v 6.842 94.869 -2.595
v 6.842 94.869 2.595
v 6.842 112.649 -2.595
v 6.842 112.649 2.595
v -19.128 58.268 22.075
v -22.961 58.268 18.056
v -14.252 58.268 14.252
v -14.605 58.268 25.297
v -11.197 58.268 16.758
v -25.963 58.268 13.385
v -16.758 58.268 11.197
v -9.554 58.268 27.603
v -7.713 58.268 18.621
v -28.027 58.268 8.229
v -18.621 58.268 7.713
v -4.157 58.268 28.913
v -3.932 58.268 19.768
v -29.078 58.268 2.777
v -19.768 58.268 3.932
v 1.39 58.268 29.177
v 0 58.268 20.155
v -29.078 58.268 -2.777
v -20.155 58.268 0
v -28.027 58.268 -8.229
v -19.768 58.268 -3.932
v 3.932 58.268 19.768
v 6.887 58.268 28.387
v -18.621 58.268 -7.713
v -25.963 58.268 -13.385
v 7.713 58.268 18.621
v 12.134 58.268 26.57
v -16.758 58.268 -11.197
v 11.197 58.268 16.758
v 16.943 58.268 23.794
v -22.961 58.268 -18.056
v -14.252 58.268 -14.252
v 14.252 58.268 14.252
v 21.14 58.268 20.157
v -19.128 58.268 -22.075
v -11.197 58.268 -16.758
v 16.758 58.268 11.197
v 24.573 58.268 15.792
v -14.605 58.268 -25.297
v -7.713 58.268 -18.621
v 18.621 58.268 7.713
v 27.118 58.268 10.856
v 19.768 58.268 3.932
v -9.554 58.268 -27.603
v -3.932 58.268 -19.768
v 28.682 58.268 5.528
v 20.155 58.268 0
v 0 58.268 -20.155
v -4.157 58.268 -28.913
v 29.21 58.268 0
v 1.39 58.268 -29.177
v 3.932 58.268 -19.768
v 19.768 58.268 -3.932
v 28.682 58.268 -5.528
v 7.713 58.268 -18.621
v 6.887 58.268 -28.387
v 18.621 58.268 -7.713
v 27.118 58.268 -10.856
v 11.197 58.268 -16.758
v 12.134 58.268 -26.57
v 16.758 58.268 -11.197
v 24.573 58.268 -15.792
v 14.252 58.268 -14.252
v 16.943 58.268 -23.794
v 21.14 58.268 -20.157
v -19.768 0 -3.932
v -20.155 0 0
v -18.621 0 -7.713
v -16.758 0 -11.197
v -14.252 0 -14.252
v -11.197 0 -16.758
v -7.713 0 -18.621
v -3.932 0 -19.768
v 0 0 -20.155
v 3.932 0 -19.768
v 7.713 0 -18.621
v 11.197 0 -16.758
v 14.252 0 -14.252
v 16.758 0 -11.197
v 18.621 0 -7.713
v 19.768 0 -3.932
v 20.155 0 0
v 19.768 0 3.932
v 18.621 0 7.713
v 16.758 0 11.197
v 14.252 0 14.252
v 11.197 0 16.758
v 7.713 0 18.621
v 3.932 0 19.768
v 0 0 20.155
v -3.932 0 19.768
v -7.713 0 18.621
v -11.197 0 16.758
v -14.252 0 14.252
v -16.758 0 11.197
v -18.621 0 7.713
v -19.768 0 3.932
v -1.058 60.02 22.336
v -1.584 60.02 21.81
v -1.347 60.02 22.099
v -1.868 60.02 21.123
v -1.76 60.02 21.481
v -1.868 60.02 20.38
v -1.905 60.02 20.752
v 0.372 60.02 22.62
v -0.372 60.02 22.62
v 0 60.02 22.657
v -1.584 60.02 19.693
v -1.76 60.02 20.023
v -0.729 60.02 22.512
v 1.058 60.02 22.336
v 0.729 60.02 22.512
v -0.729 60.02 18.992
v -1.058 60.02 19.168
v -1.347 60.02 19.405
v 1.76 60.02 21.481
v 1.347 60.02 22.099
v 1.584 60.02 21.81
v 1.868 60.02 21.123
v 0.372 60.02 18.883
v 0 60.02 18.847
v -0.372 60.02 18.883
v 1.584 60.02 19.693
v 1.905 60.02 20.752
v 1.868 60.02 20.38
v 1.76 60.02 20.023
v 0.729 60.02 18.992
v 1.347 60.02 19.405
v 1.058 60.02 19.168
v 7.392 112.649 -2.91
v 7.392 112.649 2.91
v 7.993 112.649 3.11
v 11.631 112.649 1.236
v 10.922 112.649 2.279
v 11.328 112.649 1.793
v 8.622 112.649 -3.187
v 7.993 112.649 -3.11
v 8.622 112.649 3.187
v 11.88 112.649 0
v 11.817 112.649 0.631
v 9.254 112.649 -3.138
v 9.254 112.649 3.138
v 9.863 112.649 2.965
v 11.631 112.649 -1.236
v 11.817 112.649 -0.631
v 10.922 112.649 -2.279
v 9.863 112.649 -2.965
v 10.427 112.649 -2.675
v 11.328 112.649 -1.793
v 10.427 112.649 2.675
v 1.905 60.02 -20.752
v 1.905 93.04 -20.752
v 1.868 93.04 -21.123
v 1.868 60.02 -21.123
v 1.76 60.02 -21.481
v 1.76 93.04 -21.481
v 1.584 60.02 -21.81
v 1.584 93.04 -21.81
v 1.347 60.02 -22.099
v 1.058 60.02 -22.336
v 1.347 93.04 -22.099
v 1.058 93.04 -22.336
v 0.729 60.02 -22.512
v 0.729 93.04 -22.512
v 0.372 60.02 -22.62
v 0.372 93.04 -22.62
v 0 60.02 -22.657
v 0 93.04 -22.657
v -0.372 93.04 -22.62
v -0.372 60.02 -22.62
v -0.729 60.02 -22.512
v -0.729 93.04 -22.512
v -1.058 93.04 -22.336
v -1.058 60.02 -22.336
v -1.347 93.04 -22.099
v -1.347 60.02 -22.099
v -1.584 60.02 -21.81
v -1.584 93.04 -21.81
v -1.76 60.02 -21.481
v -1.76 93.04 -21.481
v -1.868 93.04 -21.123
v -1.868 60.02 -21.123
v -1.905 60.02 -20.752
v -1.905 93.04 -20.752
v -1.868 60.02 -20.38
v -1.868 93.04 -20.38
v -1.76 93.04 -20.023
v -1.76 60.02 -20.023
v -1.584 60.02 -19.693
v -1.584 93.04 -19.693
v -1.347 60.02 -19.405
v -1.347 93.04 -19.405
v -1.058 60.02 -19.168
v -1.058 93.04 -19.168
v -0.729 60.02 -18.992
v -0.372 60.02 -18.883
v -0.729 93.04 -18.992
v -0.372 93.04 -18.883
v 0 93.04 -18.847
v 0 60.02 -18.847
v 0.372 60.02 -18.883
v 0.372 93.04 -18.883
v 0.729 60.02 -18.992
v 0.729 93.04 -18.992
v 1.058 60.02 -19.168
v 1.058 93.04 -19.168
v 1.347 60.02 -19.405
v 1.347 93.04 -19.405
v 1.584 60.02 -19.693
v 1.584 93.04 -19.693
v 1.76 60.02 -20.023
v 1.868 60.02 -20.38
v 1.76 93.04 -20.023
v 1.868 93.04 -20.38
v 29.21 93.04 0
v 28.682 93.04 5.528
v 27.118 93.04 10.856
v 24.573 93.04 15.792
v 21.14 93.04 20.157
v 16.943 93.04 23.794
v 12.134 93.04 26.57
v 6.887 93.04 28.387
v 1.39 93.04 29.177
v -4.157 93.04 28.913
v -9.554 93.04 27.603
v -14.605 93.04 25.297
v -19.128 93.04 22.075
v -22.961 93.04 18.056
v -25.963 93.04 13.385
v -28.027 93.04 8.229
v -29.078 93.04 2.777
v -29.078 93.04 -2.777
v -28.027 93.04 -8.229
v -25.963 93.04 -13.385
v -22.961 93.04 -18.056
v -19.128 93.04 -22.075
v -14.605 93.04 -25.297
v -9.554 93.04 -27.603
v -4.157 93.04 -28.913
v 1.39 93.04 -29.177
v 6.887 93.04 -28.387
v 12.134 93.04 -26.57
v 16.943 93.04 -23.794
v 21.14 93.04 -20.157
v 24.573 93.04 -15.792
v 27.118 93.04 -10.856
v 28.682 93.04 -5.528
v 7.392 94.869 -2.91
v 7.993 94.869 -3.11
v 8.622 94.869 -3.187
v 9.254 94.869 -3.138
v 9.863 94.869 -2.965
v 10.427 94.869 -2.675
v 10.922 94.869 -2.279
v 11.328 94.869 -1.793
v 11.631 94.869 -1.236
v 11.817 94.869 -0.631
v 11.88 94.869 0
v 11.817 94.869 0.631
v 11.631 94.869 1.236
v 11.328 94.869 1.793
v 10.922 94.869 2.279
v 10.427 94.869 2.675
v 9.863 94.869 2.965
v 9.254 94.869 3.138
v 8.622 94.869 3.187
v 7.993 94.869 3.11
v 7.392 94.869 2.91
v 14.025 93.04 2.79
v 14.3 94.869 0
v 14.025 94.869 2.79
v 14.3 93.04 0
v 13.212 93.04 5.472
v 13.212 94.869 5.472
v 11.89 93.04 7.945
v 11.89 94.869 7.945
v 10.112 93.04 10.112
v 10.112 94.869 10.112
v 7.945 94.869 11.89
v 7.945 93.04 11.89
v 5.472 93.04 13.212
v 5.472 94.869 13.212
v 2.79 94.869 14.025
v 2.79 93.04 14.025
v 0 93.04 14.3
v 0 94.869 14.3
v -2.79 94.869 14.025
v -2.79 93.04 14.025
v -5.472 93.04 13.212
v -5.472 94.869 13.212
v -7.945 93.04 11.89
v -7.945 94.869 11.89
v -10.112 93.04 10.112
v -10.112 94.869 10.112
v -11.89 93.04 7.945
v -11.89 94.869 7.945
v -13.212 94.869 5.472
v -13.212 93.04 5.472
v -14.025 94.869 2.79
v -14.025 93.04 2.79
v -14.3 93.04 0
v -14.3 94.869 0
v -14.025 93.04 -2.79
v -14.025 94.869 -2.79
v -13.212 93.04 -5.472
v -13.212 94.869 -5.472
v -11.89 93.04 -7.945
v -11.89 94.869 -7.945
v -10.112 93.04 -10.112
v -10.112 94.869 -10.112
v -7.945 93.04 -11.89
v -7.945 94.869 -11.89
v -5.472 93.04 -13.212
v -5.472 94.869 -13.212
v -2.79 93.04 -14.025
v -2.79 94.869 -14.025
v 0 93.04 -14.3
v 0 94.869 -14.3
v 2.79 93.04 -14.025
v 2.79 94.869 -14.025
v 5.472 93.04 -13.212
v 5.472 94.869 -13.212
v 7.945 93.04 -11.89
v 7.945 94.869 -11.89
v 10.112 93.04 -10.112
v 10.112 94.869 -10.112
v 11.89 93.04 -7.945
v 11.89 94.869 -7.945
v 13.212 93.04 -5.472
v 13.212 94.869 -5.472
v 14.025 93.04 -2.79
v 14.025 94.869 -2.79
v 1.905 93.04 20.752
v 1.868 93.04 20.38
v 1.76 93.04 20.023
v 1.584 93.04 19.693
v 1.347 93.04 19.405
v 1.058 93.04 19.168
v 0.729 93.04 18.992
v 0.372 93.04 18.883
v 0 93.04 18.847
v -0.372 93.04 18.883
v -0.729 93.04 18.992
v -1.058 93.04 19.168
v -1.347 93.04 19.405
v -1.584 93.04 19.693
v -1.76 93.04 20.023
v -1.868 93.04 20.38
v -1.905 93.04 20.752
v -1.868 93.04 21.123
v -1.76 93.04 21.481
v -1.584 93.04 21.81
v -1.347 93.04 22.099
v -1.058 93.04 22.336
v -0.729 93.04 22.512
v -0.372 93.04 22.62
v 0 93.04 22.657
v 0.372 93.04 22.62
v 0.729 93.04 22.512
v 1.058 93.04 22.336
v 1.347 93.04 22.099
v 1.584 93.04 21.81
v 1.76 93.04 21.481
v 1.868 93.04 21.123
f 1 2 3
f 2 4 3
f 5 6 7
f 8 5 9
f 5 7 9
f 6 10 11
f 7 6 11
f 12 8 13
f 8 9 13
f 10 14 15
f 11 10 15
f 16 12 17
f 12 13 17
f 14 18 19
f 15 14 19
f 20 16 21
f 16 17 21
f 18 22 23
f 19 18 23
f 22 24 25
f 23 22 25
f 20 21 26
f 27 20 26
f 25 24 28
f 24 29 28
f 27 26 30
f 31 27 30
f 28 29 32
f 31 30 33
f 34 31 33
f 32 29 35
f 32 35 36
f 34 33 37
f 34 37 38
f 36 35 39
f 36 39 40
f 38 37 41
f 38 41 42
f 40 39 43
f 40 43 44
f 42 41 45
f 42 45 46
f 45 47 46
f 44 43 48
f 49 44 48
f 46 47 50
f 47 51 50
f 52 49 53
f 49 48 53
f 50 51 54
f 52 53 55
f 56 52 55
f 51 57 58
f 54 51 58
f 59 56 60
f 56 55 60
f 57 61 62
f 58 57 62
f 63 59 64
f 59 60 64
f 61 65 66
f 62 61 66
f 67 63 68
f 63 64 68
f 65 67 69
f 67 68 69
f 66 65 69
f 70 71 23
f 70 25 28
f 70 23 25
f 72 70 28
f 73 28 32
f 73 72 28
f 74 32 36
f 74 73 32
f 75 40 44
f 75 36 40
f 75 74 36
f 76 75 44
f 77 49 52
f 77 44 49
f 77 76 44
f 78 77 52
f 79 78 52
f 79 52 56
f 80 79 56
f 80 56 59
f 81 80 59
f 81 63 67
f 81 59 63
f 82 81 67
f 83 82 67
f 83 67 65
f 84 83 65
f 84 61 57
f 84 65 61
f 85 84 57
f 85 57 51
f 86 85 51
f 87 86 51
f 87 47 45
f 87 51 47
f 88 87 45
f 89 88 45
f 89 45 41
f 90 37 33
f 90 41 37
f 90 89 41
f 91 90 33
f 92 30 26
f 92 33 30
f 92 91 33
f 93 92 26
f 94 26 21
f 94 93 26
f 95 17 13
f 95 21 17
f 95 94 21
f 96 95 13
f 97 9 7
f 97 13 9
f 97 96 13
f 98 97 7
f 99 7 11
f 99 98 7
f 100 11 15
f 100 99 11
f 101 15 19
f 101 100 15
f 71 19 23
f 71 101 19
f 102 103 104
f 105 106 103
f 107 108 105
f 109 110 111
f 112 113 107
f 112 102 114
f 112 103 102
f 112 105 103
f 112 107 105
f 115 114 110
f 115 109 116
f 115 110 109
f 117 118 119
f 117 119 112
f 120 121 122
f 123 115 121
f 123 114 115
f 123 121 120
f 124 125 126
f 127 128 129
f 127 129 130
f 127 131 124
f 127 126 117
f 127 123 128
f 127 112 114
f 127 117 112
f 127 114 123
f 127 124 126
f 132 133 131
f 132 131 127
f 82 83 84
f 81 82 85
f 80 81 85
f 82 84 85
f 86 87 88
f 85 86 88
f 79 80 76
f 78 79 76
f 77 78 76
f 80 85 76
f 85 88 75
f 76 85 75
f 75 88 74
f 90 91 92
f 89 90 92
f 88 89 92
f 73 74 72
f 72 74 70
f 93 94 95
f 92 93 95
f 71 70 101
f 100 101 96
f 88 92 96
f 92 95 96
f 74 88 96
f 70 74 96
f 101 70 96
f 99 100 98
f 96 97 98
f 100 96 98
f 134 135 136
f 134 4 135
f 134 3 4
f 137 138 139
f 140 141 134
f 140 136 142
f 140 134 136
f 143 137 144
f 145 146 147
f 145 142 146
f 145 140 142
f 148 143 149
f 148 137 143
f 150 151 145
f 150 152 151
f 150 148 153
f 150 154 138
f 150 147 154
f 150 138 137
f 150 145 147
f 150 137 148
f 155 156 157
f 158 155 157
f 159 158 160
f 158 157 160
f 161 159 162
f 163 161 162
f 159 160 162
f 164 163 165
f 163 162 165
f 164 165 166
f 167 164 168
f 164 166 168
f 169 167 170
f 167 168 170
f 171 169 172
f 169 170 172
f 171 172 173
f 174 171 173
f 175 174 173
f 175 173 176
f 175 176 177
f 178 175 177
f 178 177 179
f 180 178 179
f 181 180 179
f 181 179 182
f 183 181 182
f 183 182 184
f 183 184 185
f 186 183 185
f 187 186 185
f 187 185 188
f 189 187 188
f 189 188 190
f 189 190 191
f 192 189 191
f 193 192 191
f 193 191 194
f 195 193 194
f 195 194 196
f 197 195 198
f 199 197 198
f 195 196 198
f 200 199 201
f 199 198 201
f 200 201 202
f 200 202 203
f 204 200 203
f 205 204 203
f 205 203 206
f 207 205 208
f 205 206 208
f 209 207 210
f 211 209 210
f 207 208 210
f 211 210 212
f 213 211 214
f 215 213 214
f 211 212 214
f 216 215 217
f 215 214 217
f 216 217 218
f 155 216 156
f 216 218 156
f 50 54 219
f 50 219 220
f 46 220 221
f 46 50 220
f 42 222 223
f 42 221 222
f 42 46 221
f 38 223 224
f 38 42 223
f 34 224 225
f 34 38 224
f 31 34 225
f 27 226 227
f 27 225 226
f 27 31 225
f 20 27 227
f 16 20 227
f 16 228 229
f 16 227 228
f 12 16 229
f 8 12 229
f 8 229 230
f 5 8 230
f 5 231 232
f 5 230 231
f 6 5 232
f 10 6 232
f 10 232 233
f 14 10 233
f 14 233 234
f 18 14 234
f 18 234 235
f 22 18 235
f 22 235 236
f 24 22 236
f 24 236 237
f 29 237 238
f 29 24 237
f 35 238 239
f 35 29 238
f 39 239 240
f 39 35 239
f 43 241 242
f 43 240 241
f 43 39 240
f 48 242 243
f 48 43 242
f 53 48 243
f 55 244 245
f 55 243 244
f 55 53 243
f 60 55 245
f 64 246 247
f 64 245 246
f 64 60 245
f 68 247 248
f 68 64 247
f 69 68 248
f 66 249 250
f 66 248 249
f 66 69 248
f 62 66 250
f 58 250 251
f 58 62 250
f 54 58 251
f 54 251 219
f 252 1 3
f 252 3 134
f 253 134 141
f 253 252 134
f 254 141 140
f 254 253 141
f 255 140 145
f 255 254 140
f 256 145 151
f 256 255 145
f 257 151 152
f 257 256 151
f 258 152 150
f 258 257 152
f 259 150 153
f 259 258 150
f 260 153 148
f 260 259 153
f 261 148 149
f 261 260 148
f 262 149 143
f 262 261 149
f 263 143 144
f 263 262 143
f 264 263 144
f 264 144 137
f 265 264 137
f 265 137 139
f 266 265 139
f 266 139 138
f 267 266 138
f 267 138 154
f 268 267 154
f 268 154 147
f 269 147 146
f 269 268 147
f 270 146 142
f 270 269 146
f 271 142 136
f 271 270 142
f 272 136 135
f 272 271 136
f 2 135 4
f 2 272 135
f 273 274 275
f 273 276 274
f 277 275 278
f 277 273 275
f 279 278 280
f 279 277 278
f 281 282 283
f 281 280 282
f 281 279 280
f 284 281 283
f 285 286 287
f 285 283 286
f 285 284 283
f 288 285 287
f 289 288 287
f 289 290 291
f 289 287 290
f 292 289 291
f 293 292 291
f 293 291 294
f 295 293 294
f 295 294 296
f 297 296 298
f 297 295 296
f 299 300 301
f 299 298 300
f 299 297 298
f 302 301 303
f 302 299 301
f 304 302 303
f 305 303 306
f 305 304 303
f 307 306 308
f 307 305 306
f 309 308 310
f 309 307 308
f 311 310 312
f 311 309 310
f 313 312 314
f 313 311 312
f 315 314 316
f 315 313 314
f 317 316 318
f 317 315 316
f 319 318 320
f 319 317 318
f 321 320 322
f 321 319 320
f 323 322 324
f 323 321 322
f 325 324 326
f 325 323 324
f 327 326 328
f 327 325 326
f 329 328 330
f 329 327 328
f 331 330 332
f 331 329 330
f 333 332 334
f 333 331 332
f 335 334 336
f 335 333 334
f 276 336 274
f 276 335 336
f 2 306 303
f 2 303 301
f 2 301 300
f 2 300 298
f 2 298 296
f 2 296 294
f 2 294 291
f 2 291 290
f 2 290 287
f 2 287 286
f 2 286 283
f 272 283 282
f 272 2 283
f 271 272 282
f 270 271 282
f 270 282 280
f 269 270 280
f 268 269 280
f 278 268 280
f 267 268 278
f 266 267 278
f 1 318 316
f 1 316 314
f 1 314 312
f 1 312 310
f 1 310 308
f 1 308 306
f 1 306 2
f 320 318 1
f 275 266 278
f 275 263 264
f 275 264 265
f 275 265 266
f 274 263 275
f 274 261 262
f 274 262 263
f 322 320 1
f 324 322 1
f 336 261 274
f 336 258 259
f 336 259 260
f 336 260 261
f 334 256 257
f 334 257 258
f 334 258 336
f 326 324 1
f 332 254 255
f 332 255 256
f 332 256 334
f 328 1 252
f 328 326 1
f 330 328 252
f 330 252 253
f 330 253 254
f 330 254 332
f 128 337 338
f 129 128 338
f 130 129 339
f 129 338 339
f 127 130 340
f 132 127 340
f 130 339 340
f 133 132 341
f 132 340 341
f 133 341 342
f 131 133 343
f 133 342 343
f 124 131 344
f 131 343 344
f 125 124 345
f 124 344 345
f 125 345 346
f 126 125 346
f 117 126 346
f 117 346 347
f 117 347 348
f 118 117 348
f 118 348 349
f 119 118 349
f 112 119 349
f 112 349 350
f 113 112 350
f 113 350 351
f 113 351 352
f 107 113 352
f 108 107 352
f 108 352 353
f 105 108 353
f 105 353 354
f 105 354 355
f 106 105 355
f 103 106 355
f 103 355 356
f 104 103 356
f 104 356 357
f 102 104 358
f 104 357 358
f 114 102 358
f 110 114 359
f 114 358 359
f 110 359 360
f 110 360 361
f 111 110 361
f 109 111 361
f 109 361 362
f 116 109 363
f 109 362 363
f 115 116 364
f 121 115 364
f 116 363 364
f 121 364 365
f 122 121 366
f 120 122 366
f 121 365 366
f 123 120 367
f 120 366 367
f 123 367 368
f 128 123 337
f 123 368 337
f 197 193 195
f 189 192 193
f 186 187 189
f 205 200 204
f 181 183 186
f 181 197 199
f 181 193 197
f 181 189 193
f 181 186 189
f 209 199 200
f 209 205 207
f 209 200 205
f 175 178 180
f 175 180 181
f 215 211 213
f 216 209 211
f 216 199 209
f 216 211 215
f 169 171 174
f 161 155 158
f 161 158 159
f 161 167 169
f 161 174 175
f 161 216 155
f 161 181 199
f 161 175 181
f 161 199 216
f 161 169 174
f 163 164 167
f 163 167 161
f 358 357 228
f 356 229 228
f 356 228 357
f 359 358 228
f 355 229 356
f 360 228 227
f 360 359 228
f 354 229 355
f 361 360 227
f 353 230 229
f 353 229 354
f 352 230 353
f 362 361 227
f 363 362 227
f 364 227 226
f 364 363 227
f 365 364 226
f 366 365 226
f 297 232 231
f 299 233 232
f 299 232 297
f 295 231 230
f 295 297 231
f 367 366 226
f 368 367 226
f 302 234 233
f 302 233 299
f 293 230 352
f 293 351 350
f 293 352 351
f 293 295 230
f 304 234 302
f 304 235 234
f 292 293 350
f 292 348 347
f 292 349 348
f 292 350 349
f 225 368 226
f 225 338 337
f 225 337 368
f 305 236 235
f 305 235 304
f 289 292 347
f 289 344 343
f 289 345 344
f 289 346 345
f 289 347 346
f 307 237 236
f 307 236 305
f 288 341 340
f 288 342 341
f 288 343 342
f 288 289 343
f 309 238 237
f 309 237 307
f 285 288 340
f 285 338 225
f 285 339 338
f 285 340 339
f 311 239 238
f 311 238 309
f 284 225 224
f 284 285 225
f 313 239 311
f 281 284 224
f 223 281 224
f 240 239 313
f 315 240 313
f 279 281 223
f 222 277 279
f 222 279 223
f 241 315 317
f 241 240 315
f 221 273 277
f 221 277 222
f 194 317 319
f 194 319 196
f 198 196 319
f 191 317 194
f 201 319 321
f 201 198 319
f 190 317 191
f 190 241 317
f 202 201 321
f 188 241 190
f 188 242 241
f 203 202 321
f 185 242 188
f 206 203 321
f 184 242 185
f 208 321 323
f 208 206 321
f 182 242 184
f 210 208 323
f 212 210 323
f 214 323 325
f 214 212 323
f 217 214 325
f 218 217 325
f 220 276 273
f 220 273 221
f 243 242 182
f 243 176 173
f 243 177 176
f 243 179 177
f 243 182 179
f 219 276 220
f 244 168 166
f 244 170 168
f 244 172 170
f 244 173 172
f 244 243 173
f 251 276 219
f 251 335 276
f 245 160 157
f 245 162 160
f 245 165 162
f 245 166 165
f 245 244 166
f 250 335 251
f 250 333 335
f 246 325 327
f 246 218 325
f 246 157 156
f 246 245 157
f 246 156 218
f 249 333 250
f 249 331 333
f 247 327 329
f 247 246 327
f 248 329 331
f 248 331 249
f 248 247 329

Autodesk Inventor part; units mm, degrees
ref_plane "YZ Plane" through (0, 0, 0) normal (1, 0, 0) x (0, 1, 0)
ref_plane "XZ Plane" through (0, 0, 0) normal (0, 1, 0) x (-1, 0, 0)
ref_plane "XY Plane" through (0, 0, 0) normal (0, 0, 1) x (1, 0, 0)
sketch "Sketch1" plane through (0, 0, 0) normal (0, 1, 0) x (-1, 0, 0)
  circle A0 centre (0, 0) radius 20.1549
  dimension "d0" = 40.3098
extrude "Extrusion1" add sketch "Sketch1" along normal blind 58.2676
sketch "Sketch2" plane through (0, 58.2676, 0) normal (0, 1, 0) x (1, 0, 0)
  circle A0 centre (0, 0) radius 29.21
  dimension "d3" = 58.42
extrude "Extrusion2" add sketch "Sketch2" along normal blind 34.7726
sketch "Sketch3" plane through (0, 93.0402, 0) normal (0, 1, 0) x (1, 0, 0)
  circle A0 centre (0, 0) radius 14.3002
  dimension "d6" = 28.6004
extrude "Extrusion3" add sketch "Sketch3" along normal blind 1.8288
sketch "Sketch4" plane through (0, 93.0402, 0) normal (0, 1, 0) x (1, 0, 0)
  circle A0 centre (0, 20.7518) radius 1.905
  circle A1 centre (0, 0) radius 14.3002 projected
  line L0 (-34.2978, 0) -> (34.9424, 0) construction
  circle A2 centre (0, -20.7518) radius 1.905
  dimension "d9" = 3.81
  dimension "d10" = 4.5466
extrude "Extrusion4" cut sketch "Sketch4" against normal blind 33.02 contours A0 | A2
sketch "Sketch5" plane through (0, 94.869, 0) normal (0, 1, 0) x (1, 0, 0)
  circle A0 centre (8.6926, 0) radius 3.1877
  point P0 (0, 0)
  dimension "d13" = 6.3754
  dimension "d14" = 8.6926
extrude "Extrusion5" add sketch "Sketch5" along normal blind 17.78
sketch "Sketch6" plane through (8.6926, 112.649, 0) normal (0, 1, 0) x (1, 0, 0)
  circle A0 centre (0, 0) radius 3.1877 projected
  line L0 (-1.8509, -2.5953) -> (-1.8509, 2.5953)
  arc A1 (-1.8509, 2.5953) -> (-1.8509, -2.5953) centre (0, 0) ccw
  point P0 (-8.6926, 0)
extrude "Extrusion6" cut sketch "Sketch6" against normal blind 17.78 contours L0 A0 picked at (-2.2965, 0)
properties part number "Autofeeder motor"
